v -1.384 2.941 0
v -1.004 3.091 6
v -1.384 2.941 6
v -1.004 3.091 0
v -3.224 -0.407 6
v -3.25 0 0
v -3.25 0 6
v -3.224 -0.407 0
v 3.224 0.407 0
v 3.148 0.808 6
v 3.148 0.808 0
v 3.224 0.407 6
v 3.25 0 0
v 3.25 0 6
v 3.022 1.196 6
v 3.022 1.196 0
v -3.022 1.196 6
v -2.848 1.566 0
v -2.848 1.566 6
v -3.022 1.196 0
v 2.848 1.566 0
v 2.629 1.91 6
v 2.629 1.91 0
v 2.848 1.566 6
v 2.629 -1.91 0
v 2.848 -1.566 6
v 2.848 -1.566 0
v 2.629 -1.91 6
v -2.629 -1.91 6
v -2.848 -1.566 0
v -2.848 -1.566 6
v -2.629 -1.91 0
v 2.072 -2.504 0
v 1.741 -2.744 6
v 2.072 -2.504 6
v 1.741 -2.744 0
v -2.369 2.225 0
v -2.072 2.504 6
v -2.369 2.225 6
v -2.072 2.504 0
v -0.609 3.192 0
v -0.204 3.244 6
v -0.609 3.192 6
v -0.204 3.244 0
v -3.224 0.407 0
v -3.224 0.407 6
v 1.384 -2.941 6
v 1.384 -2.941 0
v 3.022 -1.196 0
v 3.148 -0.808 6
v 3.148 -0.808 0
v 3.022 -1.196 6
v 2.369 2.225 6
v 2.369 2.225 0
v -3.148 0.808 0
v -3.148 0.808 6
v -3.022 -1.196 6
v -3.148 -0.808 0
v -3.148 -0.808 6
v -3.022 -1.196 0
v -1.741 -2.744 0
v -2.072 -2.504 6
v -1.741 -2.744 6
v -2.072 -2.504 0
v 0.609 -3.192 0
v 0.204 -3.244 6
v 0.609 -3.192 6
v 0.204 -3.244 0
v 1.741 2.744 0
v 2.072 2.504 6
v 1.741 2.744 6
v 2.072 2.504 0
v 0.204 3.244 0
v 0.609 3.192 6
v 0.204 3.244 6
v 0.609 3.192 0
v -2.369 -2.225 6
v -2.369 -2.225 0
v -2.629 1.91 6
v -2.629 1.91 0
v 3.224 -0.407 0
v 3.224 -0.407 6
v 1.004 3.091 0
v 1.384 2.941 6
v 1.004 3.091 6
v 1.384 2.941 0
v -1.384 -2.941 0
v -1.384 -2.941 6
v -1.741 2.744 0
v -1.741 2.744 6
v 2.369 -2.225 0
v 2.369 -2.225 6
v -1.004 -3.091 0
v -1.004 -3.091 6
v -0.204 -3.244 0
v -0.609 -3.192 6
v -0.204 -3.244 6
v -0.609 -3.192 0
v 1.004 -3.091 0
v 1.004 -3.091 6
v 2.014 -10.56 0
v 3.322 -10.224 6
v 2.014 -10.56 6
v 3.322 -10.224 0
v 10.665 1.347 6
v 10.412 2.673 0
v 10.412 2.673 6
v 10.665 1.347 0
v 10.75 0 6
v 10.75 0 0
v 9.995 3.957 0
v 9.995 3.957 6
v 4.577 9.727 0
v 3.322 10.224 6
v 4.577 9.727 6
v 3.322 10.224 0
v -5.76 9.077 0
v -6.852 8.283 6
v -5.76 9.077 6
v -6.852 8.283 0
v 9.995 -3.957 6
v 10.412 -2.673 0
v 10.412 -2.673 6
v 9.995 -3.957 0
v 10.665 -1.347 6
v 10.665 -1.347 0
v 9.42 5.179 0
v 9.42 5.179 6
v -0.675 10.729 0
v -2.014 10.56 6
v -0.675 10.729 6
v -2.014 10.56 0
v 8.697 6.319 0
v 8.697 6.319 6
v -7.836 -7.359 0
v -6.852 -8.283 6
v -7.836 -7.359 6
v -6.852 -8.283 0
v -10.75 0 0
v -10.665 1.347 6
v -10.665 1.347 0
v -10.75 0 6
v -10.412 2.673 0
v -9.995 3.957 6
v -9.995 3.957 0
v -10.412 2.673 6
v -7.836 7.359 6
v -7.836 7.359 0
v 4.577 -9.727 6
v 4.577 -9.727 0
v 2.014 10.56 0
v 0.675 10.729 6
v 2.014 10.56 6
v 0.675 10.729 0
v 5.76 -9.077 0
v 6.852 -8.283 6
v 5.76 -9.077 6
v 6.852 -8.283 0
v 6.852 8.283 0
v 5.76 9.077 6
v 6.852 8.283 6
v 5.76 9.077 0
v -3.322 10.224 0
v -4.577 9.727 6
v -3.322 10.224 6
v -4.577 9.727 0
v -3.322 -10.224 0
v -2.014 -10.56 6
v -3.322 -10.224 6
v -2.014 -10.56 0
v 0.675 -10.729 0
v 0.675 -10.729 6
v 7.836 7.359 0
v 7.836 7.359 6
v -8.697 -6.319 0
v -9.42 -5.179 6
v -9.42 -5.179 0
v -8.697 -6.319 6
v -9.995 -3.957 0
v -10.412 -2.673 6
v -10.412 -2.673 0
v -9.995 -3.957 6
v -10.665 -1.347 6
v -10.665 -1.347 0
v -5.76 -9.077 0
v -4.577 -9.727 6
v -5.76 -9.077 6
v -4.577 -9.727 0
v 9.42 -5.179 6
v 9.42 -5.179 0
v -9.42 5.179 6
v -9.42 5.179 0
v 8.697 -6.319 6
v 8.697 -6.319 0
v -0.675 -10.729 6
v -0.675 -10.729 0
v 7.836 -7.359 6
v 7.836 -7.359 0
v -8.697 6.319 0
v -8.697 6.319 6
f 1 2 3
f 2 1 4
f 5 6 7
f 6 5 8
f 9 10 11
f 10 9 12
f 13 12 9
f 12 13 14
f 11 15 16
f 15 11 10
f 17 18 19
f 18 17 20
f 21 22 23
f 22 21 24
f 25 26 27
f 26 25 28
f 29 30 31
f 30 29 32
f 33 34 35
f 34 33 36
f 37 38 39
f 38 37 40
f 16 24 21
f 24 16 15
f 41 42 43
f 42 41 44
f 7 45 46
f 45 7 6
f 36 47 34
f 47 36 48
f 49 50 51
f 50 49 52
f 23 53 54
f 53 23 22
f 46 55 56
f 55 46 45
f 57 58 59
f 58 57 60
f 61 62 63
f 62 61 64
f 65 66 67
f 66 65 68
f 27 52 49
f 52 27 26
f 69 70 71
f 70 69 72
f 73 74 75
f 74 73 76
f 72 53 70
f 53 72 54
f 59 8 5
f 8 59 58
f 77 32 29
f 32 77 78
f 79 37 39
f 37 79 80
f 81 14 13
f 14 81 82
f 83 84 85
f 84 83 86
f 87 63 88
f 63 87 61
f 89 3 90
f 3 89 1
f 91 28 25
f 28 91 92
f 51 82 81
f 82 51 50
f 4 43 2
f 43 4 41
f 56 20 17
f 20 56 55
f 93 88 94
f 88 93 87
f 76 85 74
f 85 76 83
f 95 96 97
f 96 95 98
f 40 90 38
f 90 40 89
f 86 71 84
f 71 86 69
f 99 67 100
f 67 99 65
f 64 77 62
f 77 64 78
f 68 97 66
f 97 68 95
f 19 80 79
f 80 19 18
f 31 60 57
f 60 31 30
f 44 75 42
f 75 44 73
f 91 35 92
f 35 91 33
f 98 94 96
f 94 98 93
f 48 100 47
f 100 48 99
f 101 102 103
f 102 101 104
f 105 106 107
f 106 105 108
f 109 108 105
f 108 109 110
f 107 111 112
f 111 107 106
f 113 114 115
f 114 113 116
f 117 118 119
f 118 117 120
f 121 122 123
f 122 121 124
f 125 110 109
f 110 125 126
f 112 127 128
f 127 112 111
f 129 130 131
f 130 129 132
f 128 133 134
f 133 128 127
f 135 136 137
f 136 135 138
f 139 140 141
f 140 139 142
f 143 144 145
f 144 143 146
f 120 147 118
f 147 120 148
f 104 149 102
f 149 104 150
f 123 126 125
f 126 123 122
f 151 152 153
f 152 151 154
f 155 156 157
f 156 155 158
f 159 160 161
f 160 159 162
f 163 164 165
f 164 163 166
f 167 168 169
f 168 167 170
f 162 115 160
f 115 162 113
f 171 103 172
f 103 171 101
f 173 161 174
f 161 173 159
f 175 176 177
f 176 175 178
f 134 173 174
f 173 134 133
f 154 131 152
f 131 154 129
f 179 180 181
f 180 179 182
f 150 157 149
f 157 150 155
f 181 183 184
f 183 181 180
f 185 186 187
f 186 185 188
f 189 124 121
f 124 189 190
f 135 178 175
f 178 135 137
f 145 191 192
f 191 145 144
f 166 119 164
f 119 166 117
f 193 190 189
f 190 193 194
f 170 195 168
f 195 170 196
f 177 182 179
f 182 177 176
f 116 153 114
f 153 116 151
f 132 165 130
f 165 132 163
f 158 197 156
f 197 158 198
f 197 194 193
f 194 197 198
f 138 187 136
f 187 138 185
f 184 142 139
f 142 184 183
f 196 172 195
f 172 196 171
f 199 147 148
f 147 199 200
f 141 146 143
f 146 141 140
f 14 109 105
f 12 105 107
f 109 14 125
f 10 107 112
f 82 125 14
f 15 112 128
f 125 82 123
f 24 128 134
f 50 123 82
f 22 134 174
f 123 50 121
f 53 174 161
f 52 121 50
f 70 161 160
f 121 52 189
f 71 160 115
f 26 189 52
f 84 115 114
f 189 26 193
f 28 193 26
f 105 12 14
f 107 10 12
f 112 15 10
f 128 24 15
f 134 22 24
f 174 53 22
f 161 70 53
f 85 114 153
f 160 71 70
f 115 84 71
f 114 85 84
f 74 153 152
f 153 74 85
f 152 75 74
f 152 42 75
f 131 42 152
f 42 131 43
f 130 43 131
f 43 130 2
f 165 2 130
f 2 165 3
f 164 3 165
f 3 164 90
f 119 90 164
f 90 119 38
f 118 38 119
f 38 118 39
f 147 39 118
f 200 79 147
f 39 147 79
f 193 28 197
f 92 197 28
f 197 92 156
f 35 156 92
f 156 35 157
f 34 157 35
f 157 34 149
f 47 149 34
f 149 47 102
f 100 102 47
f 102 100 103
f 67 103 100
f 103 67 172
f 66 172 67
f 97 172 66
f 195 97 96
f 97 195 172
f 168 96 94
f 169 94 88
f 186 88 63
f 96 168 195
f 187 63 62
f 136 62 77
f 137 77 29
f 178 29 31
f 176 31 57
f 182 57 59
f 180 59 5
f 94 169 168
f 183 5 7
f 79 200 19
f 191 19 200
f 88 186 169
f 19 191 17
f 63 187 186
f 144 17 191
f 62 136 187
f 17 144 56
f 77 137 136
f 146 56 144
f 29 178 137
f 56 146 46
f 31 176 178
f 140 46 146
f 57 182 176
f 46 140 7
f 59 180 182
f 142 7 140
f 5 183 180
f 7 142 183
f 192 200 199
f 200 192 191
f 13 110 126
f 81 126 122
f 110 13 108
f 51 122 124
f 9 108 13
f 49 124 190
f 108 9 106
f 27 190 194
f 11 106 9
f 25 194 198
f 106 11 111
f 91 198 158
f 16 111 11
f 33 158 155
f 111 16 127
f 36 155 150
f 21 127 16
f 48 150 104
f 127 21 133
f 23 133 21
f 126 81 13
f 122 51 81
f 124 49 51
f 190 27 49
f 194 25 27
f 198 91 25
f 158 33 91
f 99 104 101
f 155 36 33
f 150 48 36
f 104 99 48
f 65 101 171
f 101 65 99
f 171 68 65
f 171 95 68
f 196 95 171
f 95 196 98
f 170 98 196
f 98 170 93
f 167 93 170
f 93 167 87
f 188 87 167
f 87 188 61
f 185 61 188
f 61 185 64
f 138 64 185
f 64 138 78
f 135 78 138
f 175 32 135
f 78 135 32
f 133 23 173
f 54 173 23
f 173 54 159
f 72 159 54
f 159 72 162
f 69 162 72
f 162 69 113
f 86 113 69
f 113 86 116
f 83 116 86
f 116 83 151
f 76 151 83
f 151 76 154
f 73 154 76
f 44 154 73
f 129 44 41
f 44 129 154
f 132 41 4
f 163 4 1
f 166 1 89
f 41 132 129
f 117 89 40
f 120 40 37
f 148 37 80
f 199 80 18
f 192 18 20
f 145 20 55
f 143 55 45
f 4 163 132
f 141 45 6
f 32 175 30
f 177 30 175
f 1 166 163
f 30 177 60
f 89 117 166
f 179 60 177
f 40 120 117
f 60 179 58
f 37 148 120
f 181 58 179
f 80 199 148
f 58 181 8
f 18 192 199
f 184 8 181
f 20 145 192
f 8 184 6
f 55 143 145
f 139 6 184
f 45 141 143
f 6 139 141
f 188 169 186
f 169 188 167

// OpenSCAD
$fn = 50;


difference() {
	union() {
		*color(alpha = 1.0000000000, c = "gray") {
			translate(v = [0, 7, 0]) {
				linear_extrude(height = 1) {
					text(font = "Arial:style=Bold", halign = "center", size = 4.5000000000, text = "COMMENT circle main", valign = "center");
				}
			}
		}
		*color(alpha = 1.0000000000, c = "gray") {
			translate(v = [0, 14, 0]) {
				linear_extrude(height = 1.5000000000) {
					text(font = "Arial:style=Bold", halign = "center", size = 4.5000000000, text = "COMMENT description oobb_circle_shape_p_type_6_depth_1.5_diameter_6_thickness_1.5_width_1.5_height", valign = "center");
				}
			}
		}
		cylinder(h = 6, r = 10.7500000000);
	}
	union() {
		*color(alpha = 1.0000000000, c = "gray") {
			translate(v = [0, 7, 0]) {
				linear_extrude(height = 1) {
					text(font = "Arial:style=Bold", halign = "center", size = 4.5000000000, text = "COMMENT holes main", valign = "center");
				}
			}
		}
		*color(alpha = 1.0000000000, c = "gray") {
			translate(v = [0, 14, 0]) {
				linear_extrude(height = 1.5000000000) {
					text(font = "Arial:style=Bold", halign = "center", size = 4.5000000000, text = "COMMENT description oobb_holes_shape_n_type_1.5_diameter_6_thickness_1.5_width_1.5_height_true_both_holes_true_circle", valign = "center");
				}
			}
		}
		translate(v = [0.0000000000, 0.0000000000, -50.0000000000]) {
			cylinder(h = 100, r = 3.2500000000);
		}
		translate(v = [0.0000000000, 0.0000000000, -50.0000000000]) {
			cylinder(h = 100, r = 3.2500000000);
		}
		translate(v = [0.0000000000, 0.0000000000, -50.0000000000]) {
			cylinder(h = 100, r = 3.2500000000);
		}
	}
}
